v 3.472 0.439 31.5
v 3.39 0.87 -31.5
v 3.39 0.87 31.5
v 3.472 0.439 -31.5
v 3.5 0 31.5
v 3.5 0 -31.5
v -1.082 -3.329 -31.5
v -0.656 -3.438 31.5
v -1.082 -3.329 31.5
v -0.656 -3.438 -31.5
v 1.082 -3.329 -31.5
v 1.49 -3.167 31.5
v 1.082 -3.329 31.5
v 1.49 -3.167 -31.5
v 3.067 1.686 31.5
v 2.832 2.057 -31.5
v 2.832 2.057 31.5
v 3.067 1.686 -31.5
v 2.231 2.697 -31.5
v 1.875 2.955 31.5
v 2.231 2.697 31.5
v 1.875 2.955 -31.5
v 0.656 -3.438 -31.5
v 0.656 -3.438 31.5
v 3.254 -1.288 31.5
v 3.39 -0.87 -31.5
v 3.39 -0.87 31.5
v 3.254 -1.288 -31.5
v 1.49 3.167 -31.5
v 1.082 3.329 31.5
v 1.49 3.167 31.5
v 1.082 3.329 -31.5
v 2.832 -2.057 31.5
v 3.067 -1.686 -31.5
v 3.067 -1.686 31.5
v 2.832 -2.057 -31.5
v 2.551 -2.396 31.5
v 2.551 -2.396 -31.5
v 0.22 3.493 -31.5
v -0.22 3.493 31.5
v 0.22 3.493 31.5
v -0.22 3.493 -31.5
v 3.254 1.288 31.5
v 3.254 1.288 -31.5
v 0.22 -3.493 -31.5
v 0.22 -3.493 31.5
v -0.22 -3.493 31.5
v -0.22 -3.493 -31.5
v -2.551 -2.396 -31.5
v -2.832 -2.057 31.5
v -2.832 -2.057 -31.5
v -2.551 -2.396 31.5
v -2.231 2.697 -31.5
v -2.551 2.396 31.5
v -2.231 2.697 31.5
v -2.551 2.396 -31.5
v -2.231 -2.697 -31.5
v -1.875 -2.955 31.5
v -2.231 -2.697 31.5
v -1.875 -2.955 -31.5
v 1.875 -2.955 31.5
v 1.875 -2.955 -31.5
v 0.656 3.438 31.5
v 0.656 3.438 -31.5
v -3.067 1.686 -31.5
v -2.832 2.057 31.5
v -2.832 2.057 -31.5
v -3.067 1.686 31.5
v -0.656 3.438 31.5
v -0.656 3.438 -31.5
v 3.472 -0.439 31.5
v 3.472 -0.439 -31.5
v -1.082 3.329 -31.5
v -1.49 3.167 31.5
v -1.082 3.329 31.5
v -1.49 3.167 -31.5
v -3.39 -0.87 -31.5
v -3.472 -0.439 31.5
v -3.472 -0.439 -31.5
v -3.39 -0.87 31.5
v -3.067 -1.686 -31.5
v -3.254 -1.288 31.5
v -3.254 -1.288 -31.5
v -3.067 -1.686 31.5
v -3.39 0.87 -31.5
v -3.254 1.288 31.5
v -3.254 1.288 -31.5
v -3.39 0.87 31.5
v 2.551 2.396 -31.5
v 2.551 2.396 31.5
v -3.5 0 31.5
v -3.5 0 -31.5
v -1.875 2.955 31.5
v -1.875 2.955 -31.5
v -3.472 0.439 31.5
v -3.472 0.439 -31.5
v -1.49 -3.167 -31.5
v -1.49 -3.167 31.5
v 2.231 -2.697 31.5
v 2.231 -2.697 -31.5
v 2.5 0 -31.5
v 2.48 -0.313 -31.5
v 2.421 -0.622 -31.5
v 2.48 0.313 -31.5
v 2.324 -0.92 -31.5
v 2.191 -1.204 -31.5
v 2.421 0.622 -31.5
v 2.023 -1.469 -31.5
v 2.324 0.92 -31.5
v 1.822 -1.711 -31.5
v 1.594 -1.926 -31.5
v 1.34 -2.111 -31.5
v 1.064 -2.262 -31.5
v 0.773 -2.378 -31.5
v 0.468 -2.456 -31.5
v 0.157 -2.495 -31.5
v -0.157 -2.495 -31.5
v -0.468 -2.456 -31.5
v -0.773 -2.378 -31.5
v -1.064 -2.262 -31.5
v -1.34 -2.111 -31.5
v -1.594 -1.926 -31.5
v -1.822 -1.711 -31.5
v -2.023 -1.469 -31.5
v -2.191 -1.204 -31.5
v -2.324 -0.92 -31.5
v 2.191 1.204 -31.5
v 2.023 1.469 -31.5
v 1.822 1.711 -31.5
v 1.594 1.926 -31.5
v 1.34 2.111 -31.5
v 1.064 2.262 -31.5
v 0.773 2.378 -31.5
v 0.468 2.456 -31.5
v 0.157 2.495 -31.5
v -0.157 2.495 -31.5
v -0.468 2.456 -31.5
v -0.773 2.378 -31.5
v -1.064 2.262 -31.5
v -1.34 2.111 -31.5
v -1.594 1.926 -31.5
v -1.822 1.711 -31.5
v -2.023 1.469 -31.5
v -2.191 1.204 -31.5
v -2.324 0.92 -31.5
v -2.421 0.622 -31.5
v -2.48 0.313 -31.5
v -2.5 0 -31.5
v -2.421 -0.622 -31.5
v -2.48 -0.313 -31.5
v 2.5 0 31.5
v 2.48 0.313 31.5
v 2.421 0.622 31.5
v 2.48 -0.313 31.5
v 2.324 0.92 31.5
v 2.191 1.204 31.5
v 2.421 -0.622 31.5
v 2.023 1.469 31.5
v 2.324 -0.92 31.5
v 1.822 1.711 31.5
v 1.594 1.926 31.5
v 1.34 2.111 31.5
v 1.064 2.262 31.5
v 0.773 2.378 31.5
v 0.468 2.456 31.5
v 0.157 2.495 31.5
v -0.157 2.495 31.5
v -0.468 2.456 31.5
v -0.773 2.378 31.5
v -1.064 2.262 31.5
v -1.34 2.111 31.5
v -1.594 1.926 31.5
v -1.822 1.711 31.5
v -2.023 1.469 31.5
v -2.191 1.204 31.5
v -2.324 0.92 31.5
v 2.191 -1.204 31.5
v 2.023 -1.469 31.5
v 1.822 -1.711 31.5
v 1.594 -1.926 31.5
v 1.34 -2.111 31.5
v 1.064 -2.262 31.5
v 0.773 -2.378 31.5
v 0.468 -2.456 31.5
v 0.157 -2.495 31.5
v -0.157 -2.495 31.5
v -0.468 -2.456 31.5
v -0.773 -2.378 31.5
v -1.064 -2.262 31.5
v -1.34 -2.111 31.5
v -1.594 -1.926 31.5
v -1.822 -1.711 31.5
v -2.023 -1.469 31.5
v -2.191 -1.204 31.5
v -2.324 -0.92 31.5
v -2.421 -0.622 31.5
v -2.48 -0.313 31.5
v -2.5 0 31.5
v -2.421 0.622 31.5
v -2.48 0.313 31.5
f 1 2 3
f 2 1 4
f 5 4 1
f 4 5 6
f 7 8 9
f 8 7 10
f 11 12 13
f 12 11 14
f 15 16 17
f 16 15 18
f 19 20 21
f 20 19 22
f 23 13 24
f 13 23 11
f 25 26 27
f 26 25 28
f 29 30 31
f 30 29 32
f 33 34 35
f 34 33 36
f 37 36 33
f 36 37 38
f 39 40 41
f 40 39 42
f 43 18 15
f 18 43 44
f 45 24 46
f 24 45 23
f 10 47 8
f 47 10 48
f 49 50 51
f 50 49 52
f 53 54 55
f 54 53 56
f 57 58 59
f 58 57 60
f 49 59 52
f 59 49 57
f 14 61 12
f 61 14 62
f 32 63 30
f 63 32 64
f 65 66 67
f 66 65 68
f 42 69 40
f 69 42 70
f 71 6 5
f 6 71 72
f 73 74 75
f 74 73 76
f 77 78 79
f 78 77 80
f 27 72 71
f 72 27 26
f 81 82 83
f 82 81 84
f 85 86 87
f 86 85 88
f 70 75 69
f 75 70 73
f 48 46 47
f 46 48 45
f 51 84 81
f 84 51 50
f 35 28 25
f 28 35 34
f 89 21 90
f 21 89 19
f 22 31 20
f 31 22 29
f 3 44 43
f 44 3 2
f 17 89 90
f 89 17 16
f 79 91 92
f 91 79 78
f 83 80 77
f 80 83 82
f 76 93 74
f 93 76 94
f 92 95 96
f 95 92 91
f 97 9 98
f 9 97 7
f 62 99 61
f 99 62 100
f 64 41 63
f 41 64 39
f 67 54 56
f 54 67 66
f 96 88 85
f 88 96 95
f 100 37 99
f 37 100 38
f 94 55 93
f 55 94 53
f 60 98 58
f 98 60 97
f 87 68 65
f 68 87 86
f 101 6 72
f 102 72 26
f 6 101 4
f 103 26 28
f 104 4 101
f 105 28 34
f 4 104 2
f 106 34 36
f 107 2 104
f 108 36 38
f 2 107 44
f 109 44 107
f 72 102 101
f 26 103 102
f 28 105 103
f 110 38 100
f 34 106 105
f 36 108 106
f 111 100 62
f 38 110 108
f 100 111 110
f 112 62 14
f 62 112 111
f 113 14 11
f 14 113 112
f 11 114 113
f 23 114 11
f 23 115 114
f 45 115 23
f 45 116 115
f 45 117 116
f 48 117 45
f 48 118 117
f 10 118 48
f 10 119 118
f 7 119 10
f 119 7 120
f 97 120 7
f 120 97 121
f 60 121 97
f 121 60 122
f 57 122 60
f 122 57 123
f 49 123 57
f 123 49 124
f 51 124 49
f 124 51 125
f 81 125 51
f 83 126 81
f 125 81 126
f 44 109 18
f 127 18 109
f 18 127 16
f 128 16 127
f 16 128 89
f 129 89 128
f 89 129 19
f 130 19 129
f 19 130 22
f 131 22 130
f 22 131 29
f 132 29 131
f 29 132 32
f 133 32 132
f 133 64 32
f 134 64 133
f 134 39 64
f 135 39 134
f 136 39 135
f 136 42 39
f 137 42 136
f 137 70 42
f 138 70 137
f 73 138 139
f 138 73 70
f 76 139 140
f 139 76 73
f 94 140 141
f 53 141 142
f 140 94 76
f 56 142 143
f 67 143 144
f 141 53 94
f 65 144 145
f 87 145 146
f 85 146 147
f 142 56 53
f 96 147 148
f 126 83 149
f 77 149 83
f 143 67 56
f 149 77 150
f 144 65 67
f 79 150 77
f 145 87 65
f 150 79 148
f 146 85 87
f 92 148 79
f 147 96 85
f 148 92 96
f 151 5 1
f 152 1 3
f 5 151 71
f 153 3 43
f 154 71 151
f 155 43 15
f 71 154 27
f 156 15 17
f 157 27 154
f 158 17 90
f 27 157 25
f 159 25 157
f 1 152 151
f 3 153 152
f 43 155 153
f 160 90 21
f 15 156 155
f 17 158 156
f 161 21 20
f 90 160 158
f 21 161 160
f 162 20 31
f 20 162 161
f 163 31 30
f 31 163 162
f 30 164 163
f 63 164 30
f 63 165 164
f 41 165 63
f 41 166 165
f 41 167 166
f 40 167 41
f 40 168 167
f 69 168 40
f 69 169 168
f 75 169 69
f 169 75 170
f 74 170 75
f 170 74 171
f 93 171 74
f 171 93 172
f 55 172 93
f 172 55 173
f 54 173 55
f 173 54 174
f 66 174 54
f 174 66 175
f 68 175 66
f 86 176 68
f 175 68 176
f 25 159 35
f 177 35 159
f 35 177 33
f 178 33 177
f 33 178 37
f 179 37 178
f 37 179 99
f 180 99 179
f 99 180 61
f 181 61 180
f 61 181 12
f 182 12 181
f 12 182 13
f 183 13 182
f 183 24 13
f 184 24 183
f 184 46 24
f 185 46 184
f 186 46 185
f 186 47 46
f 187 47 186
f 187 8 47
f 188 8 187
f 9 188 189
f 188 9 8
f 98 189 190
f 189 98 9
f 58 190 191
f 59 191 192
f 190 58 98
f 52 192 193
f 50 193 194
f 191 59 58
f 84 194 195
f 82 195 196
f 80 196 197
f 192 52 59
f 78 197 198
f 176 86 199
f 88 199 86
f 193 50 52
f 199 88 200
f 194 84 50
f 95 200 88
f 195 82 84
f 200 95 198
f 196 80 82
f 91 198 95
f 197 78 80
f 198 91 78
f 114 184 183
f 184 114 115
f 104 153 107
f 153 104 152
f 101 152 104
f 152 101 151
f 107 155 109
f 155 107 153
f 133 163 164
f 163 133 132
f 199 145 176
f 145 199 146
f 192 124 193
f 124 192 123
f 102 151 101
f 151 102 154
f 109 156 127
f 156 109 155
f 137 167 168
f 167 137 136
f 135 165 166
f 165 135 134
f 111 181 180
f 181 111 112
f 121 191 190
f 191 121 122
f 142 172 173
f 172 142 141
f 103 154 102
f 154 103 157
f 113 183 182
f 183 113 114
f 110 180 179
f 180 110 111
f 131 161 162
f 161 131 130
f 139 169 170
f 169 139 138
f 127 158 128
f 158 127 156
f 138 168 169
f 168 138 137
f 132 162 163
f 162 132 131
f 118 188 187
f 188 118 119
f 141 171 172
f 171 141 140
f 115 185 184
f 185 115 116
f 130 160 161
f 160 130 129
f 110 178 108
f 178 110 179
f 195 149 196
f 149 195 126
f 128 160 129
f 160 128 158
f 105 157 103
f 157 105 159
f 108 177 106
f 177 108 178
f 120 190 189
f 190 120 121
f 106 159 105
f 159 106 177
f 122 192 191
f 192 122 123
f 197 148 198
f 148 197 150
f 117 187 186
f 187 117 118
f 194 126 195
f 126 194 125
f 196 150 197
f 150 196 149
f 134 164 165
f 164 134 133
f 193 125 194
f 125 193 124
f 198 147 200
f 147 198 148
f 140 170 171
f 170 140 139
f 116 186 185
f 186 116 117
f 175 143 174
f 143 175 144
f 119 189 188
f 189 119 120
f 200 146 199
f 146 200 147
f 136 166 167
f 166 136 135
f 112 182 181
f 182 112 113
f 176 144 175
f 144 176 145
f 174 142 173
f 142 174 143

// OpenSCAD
$fn = 50;


difference() {
	union() {
		translate(v = [0, 0, -31.5000000000]) {
			cylinder(h = 63, r = 3.5000000000);
		}
	}
	union() {
		translate(v = [0, 0, -100.0000000000]) {
			cylinder(h = 200, r = 2.5000000000);
		}
	}
}
